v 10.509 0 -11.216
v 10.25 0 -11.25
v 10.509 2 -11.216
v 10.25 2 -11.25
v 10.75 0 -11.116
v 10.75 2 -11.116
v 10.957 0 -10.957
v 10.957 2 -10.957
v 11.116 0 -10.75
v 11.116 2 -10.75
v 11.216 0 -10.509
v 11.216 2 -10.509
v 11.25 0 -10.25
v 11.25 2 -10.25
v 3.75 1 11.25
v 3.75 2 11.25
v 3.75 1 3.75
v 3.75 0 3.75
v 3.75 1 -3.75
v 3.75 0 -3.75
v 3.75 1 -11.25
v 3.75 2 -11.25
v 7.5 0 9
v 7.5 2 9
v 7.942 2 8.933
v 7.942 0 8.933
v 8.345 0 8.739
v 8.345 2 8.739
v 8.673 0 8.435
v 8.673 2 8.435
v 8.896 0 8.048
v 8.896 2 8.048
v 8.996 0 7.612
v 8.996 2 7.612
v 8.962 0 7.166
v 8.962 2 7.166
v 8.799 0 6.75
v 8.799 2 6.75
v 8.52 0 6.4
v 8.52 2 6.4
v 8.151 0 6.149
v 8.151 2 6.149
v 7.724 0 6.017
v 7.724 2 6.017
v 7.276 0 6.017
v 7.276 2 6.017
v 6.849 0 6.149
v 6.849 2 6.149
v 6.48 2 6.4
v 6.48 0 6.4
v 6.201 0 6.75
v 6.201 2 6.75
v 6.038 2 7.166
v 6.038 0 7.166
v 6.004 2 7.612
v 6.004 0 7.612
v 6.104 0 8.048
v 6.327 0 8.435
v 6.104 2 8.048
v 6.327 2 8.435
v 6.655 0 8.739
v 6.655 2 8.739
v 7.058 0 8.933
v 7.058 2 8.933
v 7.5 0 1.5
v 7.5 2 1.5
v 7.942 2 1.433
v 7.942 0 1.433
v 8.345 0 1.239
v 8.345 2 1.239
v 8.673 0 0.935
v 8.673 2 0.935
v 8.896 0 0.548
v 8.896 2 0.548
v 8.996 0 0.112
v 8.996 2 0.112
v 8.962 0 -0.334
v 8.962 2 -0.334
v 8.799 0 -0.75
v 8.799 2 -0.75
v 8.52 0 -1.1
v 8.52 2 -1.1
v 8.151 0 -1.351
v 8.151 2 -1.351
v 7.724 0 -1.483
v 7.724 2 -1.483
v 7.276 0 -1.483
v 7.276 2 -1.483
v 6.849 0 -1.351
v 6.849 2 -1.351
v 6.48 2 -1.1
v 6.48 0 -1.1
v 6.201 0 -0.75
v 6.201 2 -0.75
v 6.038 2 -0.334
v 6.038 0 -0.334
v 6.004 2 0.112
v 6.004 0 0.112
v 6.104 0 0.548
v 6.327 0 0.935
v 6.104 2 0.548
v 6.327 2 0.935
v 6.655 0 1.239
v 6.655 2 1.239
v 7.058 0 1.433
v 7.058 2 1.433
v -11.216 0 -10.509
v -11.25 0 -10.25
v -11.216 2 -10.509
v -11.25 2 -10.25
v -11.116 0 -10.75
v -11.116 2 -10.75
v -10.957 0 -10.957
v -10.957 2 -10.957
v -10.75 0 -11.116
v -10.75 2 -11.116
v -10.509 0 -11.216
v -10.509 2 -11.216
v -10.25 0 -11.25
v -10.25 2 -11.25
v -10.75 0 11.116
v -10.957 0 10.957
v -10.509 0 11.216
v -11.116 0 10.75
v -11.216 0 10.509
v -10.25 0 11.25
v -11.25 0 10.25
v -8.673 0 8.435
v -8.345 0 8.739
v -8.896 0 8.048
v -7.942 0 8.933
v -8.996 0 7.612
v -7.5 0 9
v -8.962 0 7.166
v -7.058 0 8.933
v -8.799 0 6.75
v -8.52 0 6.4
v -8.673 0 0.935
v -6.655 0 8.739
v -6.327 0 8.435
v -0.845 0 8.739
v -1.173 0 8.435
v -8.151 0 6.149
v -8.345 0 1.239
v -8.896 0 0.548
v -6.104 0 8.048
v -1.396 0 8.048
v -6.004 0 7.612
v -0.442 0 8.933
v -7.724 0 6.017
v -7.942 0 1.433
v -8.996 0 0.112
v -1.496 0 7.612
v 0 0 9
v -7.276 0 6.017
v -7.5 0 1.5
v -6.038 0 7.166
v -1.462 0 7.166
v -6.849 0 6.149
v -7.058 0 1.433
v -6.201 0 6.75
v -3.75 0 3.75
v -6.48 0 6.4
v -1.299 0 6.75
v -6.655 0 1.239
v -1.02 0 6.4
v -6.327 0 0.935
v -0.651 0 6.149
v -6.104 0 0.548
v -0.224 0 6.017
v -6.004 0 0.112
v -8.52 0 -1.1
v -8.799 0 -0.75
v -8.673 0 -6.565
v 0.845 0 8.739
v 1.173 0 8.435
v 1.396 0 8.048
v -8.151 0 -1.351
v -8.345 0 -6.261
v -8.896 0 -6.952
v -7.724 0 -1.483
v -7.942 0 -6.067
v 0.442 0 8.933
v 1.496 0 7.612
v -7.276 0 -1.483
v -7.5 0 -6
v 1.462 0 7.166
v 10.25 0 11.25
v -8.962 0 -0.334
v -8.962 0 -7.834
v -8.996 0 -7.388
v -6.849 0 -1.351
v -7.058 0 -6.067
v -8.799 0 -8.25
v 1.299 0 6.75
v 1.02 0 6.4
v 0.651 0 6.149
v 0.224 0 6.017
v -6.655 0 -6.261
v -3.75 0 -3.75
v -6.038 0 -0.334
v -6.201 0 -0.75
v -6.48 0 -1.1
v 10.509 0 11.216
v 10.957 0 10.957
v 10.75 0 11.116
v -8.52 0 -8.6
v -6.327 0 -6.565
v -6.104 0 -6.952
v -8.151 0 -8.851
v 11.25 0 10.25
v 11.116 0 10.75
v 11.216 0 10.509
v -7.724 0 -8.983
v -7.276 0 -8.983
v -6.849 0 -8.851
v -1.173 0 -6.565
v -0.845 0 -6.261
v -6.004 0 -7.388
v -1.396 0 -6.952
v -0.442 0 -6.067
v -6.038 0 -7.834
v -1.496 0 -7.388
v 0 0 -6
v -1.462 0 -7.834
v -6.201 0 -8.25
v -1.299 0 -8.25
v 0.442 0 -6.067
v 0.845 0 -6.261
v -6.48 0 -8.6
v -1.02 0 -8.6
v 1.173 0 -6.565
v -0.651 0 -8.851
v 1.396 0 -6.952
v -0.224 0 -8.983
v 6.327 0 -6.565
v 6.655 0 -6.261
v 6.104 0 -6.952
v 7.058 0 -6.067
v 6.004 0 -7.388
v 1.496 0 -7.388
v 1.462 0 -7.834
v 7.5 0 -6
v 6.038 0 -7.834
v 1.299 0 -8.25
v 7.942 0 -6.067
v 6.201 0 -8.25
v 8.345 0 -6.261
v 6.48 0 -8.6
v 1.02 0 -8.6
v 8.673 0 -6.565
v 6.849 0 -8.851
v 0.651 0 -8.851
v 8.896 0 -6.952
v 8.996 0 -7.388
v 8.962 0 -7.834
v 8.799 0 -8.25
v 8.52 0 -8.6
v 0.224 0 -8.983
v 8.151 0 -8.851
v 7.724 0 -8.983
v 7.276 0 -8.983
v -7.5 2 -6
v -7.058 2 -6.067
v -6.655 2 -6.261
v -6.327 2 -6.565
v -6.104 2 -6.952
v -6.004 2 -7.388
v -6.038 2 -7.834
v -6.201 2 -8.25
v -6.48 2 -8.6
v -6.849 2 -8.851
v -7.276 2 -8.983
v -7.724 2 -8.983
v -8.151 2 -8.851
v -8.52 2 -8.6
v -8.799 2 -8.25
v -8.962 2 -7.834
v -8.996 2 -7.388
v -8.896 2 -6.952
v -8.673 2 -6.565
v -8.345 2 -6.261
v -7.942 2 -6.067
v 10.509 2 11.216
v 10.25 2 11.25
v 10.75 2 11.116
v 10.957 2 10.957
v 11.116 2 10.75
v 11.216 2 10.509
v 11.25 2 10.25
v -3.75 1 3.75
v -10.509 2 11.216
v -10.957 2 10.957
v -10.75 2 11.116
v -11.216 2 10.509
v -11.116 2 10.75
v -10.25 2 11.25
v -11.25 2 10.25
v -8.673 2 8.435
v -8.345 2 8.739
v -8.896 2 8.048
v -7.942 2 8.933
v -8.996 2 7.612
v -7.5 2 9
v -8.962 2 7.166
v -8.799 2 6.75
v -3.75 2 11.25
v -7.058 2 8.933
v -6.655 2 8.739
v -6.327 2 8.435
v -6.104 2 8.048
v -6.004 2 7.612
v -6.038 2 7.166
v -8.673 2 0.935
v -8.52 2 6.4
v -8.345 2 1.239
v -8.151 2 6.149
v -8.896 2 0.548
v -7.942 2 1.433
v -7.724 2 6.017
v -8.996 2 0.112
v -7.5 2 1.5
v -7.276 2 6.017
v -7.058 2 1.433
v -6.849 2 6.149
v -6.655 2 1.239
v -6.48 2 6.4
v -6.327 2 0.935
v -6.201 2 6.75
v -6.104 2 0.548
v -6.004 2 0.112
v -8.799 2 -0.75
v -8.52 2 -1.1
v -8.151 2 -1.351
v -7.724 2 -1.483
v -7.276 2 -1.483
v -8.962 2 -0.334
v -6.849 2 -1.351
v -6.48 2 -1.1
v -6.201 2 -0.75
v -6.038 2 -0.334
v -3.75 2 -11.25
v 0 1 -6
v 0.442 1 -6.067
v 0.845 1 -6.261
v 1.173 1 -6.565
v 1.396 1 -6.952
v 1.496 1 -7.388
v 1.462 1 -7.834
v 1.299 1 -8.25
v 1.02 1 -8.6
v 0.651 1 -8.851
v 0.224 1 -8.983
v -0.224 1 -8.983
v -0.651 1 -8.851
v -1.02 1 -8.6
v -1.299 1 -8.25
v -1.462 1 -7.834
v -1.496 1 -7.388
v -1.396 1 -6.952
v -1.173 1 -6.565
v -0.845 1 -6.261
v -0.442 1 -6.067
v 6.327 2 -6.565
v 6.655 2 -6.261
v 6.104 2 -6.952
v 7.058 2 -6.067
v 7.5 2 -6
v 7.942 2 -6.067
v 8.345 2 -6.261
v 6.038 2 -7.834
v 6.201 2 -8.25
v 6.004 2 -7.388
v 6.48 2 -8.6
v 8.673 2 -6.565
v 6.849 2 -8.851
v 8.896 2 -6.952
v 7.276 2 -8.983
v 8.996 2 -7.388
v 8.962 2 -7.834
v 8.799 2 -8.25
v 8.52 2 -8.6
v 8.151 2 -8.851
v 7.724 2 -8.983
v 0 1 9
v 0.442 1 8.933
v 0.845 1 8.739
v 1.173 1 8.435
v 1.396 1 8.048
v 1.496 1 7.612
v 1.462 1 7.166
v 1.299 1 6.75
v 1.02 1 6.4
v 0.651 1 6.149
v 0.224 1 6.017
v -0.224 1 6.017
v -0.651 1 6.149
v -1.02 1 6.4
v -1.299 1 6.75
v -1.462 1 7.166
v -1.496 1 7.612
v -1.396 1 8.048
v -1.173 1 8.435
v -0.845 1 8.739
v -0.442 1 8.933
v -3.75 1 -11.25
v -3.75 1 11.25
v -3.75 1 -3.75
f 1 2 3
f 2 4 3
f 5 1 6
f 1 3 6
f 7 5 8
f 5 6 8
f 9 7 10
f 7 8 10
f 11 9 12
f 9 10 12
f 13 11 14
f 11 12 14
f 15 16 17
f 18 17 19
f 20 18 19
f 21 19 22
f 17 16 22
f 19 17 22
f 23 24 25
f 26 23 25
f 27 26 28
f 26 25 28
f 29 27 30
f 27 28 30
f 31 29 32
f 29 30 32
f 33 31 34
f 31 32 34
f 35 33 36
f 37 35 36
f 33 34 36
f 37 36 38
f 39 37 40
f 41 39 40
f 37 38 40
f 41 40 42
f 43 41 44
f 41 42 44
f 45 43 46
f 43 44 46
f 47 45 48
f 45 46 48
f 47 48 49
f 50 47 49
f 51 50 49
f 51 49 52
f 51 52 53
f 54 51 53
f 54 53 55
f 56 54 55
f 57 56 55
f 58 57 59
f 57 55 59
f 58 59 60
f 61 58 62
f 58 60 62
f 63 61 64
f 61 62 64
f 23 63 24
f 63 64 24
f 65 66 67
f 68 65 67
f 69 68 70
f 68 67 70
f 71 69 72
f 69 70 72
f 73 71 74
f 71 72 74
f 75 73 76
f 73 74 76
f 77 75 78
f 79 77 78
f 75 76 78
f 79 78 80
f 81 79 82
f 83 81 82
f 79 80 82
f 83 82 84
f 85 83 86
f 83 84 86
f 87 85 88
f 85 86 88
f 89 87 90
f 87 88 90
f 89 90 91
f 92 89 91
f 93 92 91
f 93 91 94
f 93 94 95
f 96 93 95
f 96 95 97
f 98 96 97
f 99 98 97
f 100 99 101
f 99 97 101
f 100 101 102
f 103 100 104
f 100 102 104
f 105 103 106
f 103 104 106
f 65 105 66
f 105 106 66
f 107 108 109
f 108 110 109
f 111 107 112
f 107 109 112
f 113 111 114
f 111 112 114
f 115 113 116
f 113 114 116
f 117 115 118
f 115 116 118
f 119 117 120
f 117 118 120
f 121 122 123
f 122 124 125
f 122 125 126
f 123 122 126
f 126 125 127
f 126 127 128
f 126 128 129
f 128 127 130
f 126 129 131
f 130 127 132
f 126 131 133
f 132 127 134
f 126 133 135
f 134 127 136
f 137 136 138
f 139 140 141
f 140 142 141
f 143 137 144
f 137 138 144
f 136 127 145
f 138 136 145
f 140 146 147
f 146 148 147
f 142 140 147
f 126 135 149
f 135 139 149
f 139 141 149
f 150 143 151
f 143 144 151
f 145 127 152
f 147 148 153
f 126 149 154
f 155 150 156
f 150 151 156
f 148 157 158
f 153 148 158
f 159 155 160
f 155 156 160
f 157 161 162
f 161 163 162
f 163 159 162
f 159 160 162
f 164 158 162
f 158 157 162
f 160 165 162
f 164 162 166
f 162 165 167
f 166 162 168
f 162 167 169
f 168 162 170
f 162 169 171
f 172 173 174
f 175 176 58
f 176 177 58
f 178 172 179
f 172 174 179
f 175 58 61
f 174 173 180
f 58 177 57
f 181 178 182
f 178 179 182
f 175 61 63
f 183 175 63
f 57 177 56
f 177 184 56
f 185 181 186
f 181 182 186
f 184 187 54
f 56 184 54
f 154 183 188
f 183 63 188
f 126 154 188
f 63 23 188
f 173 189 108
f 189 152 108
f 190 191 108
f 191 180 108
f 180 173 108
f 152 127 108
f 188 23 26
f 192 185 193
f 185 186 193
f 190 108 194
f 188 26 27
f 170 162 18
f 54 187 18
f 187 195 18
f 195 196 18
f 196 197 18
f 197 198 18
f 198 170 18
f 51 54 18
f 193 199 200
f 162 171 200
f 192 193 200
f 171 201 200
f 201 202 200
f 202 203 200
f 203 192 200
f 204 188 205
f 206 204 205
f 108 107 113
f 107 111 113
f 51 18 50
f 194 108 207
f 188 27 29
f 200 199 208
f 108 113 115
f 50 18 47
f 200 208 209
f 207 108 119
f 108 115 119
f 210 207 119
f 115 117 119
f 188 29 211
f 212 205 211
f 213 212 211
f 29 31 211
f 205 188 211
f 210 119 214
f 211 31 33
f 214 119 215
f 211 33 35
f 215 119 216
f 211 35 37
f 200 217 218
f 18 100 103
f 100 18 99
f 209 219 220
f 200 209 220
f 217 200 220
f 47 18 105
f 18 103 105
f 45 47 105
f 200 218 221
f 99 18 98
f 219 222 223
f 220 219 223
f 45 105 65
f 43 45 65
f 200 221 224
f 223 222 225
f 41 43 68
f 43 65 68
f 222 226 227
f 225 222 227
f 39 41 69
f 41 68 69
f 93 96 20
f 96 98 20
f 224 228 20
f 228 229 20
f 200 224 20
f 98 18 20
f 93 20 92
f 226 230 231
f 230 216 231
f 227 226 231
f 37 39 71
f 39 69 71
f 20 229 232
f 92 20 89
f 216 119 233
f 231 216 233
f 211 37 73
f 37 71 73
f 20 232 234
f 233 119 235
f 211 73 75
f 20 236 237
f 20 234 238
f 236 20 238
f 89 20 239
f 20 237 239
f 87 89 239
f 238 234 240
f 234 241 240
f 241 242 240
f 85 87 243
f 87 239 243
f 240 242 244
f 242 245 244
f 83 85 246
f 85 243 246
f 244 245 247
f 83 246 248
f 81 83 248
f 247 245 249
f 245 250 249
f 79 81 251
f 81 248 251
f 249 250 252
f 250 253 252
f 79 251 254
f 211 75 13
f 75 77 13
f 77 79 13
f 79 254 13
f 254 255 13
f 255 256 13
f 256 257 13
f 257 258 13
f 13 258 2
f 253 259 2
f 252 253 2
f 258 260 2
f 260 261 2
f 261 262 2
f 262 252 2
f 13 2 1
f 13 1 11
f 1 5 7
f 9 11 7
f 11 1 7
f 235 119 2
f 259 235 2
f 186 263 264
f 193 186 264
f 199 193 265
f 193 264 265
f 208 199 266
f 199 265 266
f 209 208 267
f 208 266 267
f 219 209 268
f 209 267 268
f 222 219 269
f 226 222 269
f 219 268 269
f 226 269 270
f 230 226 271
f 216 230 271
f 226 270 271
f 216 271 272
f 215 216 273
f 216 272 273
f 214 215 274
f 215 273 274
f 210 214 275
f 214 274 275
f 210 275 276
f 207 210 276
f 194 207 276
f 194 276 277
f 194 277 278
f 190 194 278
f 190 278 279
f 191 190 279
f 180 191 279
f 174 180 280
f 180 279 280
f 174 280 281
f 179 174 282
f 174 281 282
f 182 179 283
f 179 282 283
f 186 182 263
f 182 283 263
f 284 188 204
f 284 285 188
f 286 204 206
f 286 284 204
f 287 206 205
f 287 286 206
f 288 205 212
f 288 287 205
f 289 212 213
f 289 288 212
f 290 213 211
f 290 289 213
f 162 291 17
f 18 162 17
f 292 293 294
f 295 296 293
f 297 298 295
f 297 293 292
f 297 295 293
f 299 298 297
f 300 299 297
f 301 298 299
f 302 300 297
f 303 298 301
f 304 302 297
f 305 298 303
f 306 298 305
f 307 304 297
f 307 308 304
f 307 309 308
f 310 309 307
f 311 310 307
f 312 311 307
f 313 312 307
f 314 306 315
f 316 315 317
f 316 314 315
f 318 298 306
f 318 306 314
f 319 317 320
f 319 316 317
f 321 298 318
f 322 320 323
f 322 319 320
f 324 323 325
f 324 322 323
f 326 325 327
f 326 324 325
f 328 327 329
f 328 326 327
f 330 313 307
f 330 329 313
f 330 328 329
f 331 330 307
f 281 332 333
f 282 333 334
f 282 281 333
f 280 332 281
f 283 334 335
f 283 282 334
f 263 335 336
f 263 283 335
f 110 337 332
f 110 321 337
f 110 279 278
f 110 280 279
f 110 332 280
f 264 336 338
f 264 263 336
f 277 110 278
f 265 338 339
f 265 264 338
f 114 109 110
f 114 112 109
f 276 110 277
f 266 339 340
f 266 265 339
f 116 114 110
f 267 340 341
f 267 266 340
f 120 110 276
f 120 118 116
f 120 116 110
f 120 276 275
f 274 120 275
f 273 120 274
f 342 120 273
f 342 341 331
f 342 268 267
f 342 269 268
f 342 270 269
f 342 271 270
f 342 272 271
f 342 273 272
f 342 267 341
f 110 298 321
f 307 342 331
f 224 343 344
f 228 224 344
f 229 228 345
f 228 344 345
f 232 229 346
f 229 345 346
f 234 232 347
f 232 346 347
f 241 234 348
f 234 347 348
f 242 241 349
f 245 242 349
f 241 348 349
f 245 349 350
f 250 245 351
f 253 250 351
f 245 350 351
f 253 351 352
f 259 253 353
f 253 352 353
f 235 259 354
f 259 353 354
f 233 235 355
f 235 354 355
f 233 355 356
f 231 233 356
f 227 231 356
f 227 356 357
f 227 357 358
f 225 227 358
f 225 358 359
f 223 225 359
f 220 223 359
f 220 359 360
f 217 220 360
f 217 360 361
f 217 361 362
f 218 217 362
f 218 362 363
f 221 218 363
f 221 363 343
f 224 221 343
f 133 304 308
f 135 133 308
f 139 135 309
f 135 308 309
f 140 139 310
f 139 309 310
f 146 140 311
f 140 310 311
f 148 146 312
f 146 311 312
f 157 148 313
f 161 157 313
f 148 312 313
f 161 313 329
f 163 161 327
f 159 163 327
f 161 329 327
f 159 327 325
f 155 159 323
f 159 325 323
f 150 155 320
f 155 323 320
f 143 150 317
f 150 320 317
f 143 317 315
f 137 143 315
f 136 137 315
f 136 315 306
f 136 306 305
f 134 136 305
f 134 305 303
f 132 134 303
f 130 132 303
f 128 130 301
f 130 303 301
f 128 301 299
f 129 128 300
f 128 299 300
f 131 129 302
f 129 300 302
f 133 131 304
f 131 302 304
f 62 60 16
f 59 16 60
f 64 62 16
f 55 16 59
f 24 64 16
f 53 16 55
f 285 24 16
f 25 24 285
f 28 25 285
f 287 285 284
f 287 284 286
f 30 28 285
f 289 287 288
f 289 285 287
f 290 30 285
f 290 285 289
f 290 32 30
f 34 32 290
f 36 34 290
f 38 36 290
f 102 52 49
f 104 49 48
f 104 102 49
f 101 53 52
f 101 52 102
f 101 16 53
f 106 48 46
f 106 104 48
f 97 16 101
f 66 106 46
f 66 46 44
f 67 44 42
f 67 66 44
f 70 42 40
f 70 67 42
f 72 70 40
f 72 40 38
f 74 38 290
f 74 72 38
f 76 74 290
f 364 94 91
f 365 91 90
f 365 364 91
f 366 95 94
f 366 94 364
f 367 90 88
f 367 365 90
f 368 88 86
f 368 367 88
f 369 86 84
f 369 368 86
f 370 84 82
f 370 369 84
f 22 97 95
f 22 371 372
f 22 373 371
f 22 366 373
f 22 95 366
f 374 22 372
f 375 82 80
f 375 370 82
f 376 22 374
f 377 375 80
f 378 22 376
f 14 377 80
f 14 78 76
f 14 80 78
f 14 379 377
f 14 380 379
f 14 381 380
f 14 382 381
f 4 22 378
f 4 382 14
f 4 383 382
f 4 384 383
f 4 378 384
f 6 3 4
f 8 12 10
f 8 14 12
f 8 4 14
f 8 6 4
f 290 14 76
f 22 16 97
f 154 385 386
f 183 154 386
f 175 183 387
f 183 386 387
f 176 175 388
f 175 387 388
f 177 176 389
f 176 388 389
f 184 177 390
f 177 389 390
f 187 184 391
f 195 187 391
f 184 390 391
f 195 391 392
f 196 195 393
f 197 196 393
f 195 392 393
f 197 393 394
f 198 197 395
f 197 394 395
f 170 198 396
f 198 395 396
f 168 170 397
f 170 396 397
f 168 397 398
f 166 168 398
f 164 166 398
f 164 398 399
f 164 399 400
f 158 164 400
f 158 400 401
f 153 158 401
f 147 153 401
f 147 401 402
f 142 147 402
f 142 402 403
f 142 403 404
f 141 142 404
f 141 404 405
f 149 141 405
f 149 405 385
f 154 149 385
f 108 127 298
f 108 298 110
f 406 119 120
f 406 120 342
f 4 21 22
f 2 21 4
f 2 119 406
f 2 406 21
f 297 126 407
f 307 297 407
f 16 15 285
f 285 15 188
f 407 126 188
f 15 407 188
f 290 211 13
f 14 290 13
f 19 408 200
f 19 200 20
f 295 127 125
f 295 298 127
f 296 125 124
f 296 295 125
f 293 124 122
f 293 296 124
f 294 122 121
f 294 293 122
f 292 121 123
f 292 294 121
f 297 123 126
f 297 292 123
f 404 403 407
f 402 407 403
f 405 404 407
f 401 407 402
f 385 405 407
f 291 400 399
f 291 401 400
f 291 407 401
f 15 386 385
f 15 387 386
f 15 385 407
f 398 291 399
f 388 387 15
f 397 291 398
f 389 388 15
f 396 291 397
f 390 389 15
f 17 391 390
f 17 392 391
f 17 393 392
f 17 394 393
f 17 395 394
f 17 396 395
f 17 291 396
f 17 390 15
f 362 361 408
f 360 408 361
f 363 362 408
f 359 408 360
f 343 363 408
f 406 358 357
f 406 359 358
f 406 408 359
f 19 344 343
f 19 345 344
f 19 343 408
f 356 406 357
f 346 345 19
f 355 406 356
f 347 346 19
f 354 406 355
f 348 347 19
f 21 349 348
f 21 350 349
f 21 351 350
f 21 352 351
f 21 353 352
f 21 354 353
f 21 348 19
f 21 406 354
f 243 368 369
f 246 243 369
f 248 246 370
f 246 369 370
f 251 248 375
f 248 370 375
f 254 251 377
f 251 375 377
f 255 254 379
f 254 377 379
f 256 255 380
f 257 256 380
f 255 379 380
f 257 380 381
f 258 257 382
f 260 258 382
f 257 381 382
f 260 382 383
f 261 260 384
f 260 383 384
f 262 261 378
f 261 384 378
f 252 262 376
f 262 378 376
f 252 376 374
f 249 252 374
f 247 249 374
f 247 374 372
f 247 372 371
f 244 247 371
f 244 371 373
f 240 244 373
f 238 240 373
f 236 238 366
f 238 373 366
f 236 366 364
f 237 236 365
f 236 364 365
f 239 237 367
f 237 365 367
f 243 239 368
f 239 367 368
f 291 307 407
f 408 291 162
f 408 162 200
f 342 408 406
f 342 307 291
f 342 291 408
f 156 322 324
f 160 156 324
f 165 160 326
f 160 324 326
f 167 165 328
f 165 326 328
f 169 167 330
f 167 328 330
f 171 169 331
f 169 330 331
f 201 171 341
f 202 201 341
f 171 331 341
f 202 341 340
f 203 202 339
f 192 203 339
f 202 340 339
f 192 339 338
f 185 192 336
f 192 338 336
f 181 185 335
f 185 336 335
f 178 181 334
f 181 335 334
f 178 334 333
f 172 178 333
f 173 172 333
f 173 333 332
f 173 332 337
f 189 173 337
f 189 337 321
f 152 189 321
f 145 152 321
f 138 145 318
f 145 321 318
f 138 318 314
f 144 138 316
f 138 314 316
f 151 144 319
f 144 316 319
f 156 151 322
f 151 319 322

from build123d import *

# Parameters (mm, degrees)
SKETCH1_W           = 22.5
SKETCH1_H           = 22.5
BOSS_EXTRUDE1_DEPTH = 2
SKETCH2_W           = 7.5
SKETCH2_H           = 22.5
CUT_EXTRUDE1_DEPTH  = 1
SKETCH4_R           = 1.5
CUT_EXTRUDE2_DEPTH  = 2
SKETCH5_W           = 7.5
SKETCH5_H           = 7.5
CUT_EXTRUDE3_DEPTH  = 2
SKETCH6_R           = 1.5
CUT_EXTRUDE4_DEPTH  = 2
SKETCH7_R           = 1.5
CUT_EXTRUDE5_DEPTH  = 2
FILLET1_R           = 1


with BuildPart() as part:
    # Sketch1 → Boss-Extrude1 (new body)
    with BuildSketch(Plane(origin=(0, 0, 0), x_dir=(1, 0, 0), z_dir=(0, 1, 0))):
        Rectangle(SKETCH1_W, SKETCH1_H)
    extrude(amount=BOSS_EXTRUDE1_DEPTH)

    # Sketch2 → Cut-Extrude1 (cut)
    with BuildSketch(Plane(origin=(0, 2, 0), x_dir=(1, 0, 0), z_dir=(0, 1, 0))):
        Rectangle(SKETCH2_W, SKETCH2_H)
    extrude(amount=-CUT_EXTRUDE1_DEPTH, mode=Mode.SUBTRACT)

    # Sketch4 → Cut-Extrude2 (cut)
    with BuildSketch(Plane(origin=(0, 1, 0), x_dir=(1, 0, 0), z_dir=(0, 1, 0))):
        with Locations(Location((0, 7.5, 0), (0, 0, 270))):
            Circle(SKETCH4_R)
        with Locations(Location((0, -7.5, 0), (0, 0, 270))):
            Circle(SKETCH4_R)
    extrude(amount=-CUT_EXTRUDE2_DEPTH, mode=Mode.SUBTRACT)

    # Sketch5 → Cut-Extrude3 (cut)
    with BuildSketch(Plane(origin=(0, 1, 0), x_dir=(1, 0, 0), z_dir=(0, 1, 0))):
        Rectangle(SKETCH5_W, SKETCH5_H)
    extrude(amount=-CUT_EXTRUDE3_DEPTH, mode=Mode.SUBTRACT)

    # Sketch6 → Cut-Extrude4 (cut)
    with BuildSketch(Plane(origin=(0, 2, 0), x_dir=(1, 0, 0), z_dir=(0, 1, 0))):
        with Locations(Location((-7.5, 7.5, 0), (0, 0, 270))):
            Circle(SKETCH6_R)
        with Locations(Location((-7.5, -7.5, 0), (0, 0, 270))):
            Circle(SKETCH6_R)
        with Locations(Location((-7.5, 0, 0), (0, 0, 270))):
            Circle(SKETCH6_R)
    extrude(amount=-CUT_EXTRUDE4_DEPTH, mode=Mode.SUBTRACT)

    # Sketch7 → Cut-Extrude5 (cut)
    with BuildSketch(Plane(origin=(0, 2, 0), x_dir=(1, 0, 0), z_dir=(0, 1, 0))):
        with Locations(Location((7.5, 0, 0), (0, 0, 270))):
            Circle(SKETCH7_R)
        with Locations(Location((7.5, 7.5, 0), (0, 0, 270))):
            Circle(SKETCH7_R)
        with Locations(Location((7.5, -7.5, 0), (0, 0, 270))):
            Circle(SKETCH7_R)
    extrude(amount=-CUT_EXTRUDE5_DEPTH, mode=Mode.SUBTRACT)

    # Fillet1
    fillet1_edges = [part.edges().sort_by_distance(p)[0] for p in [
        (11.25, 1, 11.25),
        (-11.25, 1, 11.25),
        (-11.25, 1, -11.25),
        (11.25, 1, -11.25),
    ]]
    fillet(fillet1_edges, radius=FILLET1_R)


solid = part.part
